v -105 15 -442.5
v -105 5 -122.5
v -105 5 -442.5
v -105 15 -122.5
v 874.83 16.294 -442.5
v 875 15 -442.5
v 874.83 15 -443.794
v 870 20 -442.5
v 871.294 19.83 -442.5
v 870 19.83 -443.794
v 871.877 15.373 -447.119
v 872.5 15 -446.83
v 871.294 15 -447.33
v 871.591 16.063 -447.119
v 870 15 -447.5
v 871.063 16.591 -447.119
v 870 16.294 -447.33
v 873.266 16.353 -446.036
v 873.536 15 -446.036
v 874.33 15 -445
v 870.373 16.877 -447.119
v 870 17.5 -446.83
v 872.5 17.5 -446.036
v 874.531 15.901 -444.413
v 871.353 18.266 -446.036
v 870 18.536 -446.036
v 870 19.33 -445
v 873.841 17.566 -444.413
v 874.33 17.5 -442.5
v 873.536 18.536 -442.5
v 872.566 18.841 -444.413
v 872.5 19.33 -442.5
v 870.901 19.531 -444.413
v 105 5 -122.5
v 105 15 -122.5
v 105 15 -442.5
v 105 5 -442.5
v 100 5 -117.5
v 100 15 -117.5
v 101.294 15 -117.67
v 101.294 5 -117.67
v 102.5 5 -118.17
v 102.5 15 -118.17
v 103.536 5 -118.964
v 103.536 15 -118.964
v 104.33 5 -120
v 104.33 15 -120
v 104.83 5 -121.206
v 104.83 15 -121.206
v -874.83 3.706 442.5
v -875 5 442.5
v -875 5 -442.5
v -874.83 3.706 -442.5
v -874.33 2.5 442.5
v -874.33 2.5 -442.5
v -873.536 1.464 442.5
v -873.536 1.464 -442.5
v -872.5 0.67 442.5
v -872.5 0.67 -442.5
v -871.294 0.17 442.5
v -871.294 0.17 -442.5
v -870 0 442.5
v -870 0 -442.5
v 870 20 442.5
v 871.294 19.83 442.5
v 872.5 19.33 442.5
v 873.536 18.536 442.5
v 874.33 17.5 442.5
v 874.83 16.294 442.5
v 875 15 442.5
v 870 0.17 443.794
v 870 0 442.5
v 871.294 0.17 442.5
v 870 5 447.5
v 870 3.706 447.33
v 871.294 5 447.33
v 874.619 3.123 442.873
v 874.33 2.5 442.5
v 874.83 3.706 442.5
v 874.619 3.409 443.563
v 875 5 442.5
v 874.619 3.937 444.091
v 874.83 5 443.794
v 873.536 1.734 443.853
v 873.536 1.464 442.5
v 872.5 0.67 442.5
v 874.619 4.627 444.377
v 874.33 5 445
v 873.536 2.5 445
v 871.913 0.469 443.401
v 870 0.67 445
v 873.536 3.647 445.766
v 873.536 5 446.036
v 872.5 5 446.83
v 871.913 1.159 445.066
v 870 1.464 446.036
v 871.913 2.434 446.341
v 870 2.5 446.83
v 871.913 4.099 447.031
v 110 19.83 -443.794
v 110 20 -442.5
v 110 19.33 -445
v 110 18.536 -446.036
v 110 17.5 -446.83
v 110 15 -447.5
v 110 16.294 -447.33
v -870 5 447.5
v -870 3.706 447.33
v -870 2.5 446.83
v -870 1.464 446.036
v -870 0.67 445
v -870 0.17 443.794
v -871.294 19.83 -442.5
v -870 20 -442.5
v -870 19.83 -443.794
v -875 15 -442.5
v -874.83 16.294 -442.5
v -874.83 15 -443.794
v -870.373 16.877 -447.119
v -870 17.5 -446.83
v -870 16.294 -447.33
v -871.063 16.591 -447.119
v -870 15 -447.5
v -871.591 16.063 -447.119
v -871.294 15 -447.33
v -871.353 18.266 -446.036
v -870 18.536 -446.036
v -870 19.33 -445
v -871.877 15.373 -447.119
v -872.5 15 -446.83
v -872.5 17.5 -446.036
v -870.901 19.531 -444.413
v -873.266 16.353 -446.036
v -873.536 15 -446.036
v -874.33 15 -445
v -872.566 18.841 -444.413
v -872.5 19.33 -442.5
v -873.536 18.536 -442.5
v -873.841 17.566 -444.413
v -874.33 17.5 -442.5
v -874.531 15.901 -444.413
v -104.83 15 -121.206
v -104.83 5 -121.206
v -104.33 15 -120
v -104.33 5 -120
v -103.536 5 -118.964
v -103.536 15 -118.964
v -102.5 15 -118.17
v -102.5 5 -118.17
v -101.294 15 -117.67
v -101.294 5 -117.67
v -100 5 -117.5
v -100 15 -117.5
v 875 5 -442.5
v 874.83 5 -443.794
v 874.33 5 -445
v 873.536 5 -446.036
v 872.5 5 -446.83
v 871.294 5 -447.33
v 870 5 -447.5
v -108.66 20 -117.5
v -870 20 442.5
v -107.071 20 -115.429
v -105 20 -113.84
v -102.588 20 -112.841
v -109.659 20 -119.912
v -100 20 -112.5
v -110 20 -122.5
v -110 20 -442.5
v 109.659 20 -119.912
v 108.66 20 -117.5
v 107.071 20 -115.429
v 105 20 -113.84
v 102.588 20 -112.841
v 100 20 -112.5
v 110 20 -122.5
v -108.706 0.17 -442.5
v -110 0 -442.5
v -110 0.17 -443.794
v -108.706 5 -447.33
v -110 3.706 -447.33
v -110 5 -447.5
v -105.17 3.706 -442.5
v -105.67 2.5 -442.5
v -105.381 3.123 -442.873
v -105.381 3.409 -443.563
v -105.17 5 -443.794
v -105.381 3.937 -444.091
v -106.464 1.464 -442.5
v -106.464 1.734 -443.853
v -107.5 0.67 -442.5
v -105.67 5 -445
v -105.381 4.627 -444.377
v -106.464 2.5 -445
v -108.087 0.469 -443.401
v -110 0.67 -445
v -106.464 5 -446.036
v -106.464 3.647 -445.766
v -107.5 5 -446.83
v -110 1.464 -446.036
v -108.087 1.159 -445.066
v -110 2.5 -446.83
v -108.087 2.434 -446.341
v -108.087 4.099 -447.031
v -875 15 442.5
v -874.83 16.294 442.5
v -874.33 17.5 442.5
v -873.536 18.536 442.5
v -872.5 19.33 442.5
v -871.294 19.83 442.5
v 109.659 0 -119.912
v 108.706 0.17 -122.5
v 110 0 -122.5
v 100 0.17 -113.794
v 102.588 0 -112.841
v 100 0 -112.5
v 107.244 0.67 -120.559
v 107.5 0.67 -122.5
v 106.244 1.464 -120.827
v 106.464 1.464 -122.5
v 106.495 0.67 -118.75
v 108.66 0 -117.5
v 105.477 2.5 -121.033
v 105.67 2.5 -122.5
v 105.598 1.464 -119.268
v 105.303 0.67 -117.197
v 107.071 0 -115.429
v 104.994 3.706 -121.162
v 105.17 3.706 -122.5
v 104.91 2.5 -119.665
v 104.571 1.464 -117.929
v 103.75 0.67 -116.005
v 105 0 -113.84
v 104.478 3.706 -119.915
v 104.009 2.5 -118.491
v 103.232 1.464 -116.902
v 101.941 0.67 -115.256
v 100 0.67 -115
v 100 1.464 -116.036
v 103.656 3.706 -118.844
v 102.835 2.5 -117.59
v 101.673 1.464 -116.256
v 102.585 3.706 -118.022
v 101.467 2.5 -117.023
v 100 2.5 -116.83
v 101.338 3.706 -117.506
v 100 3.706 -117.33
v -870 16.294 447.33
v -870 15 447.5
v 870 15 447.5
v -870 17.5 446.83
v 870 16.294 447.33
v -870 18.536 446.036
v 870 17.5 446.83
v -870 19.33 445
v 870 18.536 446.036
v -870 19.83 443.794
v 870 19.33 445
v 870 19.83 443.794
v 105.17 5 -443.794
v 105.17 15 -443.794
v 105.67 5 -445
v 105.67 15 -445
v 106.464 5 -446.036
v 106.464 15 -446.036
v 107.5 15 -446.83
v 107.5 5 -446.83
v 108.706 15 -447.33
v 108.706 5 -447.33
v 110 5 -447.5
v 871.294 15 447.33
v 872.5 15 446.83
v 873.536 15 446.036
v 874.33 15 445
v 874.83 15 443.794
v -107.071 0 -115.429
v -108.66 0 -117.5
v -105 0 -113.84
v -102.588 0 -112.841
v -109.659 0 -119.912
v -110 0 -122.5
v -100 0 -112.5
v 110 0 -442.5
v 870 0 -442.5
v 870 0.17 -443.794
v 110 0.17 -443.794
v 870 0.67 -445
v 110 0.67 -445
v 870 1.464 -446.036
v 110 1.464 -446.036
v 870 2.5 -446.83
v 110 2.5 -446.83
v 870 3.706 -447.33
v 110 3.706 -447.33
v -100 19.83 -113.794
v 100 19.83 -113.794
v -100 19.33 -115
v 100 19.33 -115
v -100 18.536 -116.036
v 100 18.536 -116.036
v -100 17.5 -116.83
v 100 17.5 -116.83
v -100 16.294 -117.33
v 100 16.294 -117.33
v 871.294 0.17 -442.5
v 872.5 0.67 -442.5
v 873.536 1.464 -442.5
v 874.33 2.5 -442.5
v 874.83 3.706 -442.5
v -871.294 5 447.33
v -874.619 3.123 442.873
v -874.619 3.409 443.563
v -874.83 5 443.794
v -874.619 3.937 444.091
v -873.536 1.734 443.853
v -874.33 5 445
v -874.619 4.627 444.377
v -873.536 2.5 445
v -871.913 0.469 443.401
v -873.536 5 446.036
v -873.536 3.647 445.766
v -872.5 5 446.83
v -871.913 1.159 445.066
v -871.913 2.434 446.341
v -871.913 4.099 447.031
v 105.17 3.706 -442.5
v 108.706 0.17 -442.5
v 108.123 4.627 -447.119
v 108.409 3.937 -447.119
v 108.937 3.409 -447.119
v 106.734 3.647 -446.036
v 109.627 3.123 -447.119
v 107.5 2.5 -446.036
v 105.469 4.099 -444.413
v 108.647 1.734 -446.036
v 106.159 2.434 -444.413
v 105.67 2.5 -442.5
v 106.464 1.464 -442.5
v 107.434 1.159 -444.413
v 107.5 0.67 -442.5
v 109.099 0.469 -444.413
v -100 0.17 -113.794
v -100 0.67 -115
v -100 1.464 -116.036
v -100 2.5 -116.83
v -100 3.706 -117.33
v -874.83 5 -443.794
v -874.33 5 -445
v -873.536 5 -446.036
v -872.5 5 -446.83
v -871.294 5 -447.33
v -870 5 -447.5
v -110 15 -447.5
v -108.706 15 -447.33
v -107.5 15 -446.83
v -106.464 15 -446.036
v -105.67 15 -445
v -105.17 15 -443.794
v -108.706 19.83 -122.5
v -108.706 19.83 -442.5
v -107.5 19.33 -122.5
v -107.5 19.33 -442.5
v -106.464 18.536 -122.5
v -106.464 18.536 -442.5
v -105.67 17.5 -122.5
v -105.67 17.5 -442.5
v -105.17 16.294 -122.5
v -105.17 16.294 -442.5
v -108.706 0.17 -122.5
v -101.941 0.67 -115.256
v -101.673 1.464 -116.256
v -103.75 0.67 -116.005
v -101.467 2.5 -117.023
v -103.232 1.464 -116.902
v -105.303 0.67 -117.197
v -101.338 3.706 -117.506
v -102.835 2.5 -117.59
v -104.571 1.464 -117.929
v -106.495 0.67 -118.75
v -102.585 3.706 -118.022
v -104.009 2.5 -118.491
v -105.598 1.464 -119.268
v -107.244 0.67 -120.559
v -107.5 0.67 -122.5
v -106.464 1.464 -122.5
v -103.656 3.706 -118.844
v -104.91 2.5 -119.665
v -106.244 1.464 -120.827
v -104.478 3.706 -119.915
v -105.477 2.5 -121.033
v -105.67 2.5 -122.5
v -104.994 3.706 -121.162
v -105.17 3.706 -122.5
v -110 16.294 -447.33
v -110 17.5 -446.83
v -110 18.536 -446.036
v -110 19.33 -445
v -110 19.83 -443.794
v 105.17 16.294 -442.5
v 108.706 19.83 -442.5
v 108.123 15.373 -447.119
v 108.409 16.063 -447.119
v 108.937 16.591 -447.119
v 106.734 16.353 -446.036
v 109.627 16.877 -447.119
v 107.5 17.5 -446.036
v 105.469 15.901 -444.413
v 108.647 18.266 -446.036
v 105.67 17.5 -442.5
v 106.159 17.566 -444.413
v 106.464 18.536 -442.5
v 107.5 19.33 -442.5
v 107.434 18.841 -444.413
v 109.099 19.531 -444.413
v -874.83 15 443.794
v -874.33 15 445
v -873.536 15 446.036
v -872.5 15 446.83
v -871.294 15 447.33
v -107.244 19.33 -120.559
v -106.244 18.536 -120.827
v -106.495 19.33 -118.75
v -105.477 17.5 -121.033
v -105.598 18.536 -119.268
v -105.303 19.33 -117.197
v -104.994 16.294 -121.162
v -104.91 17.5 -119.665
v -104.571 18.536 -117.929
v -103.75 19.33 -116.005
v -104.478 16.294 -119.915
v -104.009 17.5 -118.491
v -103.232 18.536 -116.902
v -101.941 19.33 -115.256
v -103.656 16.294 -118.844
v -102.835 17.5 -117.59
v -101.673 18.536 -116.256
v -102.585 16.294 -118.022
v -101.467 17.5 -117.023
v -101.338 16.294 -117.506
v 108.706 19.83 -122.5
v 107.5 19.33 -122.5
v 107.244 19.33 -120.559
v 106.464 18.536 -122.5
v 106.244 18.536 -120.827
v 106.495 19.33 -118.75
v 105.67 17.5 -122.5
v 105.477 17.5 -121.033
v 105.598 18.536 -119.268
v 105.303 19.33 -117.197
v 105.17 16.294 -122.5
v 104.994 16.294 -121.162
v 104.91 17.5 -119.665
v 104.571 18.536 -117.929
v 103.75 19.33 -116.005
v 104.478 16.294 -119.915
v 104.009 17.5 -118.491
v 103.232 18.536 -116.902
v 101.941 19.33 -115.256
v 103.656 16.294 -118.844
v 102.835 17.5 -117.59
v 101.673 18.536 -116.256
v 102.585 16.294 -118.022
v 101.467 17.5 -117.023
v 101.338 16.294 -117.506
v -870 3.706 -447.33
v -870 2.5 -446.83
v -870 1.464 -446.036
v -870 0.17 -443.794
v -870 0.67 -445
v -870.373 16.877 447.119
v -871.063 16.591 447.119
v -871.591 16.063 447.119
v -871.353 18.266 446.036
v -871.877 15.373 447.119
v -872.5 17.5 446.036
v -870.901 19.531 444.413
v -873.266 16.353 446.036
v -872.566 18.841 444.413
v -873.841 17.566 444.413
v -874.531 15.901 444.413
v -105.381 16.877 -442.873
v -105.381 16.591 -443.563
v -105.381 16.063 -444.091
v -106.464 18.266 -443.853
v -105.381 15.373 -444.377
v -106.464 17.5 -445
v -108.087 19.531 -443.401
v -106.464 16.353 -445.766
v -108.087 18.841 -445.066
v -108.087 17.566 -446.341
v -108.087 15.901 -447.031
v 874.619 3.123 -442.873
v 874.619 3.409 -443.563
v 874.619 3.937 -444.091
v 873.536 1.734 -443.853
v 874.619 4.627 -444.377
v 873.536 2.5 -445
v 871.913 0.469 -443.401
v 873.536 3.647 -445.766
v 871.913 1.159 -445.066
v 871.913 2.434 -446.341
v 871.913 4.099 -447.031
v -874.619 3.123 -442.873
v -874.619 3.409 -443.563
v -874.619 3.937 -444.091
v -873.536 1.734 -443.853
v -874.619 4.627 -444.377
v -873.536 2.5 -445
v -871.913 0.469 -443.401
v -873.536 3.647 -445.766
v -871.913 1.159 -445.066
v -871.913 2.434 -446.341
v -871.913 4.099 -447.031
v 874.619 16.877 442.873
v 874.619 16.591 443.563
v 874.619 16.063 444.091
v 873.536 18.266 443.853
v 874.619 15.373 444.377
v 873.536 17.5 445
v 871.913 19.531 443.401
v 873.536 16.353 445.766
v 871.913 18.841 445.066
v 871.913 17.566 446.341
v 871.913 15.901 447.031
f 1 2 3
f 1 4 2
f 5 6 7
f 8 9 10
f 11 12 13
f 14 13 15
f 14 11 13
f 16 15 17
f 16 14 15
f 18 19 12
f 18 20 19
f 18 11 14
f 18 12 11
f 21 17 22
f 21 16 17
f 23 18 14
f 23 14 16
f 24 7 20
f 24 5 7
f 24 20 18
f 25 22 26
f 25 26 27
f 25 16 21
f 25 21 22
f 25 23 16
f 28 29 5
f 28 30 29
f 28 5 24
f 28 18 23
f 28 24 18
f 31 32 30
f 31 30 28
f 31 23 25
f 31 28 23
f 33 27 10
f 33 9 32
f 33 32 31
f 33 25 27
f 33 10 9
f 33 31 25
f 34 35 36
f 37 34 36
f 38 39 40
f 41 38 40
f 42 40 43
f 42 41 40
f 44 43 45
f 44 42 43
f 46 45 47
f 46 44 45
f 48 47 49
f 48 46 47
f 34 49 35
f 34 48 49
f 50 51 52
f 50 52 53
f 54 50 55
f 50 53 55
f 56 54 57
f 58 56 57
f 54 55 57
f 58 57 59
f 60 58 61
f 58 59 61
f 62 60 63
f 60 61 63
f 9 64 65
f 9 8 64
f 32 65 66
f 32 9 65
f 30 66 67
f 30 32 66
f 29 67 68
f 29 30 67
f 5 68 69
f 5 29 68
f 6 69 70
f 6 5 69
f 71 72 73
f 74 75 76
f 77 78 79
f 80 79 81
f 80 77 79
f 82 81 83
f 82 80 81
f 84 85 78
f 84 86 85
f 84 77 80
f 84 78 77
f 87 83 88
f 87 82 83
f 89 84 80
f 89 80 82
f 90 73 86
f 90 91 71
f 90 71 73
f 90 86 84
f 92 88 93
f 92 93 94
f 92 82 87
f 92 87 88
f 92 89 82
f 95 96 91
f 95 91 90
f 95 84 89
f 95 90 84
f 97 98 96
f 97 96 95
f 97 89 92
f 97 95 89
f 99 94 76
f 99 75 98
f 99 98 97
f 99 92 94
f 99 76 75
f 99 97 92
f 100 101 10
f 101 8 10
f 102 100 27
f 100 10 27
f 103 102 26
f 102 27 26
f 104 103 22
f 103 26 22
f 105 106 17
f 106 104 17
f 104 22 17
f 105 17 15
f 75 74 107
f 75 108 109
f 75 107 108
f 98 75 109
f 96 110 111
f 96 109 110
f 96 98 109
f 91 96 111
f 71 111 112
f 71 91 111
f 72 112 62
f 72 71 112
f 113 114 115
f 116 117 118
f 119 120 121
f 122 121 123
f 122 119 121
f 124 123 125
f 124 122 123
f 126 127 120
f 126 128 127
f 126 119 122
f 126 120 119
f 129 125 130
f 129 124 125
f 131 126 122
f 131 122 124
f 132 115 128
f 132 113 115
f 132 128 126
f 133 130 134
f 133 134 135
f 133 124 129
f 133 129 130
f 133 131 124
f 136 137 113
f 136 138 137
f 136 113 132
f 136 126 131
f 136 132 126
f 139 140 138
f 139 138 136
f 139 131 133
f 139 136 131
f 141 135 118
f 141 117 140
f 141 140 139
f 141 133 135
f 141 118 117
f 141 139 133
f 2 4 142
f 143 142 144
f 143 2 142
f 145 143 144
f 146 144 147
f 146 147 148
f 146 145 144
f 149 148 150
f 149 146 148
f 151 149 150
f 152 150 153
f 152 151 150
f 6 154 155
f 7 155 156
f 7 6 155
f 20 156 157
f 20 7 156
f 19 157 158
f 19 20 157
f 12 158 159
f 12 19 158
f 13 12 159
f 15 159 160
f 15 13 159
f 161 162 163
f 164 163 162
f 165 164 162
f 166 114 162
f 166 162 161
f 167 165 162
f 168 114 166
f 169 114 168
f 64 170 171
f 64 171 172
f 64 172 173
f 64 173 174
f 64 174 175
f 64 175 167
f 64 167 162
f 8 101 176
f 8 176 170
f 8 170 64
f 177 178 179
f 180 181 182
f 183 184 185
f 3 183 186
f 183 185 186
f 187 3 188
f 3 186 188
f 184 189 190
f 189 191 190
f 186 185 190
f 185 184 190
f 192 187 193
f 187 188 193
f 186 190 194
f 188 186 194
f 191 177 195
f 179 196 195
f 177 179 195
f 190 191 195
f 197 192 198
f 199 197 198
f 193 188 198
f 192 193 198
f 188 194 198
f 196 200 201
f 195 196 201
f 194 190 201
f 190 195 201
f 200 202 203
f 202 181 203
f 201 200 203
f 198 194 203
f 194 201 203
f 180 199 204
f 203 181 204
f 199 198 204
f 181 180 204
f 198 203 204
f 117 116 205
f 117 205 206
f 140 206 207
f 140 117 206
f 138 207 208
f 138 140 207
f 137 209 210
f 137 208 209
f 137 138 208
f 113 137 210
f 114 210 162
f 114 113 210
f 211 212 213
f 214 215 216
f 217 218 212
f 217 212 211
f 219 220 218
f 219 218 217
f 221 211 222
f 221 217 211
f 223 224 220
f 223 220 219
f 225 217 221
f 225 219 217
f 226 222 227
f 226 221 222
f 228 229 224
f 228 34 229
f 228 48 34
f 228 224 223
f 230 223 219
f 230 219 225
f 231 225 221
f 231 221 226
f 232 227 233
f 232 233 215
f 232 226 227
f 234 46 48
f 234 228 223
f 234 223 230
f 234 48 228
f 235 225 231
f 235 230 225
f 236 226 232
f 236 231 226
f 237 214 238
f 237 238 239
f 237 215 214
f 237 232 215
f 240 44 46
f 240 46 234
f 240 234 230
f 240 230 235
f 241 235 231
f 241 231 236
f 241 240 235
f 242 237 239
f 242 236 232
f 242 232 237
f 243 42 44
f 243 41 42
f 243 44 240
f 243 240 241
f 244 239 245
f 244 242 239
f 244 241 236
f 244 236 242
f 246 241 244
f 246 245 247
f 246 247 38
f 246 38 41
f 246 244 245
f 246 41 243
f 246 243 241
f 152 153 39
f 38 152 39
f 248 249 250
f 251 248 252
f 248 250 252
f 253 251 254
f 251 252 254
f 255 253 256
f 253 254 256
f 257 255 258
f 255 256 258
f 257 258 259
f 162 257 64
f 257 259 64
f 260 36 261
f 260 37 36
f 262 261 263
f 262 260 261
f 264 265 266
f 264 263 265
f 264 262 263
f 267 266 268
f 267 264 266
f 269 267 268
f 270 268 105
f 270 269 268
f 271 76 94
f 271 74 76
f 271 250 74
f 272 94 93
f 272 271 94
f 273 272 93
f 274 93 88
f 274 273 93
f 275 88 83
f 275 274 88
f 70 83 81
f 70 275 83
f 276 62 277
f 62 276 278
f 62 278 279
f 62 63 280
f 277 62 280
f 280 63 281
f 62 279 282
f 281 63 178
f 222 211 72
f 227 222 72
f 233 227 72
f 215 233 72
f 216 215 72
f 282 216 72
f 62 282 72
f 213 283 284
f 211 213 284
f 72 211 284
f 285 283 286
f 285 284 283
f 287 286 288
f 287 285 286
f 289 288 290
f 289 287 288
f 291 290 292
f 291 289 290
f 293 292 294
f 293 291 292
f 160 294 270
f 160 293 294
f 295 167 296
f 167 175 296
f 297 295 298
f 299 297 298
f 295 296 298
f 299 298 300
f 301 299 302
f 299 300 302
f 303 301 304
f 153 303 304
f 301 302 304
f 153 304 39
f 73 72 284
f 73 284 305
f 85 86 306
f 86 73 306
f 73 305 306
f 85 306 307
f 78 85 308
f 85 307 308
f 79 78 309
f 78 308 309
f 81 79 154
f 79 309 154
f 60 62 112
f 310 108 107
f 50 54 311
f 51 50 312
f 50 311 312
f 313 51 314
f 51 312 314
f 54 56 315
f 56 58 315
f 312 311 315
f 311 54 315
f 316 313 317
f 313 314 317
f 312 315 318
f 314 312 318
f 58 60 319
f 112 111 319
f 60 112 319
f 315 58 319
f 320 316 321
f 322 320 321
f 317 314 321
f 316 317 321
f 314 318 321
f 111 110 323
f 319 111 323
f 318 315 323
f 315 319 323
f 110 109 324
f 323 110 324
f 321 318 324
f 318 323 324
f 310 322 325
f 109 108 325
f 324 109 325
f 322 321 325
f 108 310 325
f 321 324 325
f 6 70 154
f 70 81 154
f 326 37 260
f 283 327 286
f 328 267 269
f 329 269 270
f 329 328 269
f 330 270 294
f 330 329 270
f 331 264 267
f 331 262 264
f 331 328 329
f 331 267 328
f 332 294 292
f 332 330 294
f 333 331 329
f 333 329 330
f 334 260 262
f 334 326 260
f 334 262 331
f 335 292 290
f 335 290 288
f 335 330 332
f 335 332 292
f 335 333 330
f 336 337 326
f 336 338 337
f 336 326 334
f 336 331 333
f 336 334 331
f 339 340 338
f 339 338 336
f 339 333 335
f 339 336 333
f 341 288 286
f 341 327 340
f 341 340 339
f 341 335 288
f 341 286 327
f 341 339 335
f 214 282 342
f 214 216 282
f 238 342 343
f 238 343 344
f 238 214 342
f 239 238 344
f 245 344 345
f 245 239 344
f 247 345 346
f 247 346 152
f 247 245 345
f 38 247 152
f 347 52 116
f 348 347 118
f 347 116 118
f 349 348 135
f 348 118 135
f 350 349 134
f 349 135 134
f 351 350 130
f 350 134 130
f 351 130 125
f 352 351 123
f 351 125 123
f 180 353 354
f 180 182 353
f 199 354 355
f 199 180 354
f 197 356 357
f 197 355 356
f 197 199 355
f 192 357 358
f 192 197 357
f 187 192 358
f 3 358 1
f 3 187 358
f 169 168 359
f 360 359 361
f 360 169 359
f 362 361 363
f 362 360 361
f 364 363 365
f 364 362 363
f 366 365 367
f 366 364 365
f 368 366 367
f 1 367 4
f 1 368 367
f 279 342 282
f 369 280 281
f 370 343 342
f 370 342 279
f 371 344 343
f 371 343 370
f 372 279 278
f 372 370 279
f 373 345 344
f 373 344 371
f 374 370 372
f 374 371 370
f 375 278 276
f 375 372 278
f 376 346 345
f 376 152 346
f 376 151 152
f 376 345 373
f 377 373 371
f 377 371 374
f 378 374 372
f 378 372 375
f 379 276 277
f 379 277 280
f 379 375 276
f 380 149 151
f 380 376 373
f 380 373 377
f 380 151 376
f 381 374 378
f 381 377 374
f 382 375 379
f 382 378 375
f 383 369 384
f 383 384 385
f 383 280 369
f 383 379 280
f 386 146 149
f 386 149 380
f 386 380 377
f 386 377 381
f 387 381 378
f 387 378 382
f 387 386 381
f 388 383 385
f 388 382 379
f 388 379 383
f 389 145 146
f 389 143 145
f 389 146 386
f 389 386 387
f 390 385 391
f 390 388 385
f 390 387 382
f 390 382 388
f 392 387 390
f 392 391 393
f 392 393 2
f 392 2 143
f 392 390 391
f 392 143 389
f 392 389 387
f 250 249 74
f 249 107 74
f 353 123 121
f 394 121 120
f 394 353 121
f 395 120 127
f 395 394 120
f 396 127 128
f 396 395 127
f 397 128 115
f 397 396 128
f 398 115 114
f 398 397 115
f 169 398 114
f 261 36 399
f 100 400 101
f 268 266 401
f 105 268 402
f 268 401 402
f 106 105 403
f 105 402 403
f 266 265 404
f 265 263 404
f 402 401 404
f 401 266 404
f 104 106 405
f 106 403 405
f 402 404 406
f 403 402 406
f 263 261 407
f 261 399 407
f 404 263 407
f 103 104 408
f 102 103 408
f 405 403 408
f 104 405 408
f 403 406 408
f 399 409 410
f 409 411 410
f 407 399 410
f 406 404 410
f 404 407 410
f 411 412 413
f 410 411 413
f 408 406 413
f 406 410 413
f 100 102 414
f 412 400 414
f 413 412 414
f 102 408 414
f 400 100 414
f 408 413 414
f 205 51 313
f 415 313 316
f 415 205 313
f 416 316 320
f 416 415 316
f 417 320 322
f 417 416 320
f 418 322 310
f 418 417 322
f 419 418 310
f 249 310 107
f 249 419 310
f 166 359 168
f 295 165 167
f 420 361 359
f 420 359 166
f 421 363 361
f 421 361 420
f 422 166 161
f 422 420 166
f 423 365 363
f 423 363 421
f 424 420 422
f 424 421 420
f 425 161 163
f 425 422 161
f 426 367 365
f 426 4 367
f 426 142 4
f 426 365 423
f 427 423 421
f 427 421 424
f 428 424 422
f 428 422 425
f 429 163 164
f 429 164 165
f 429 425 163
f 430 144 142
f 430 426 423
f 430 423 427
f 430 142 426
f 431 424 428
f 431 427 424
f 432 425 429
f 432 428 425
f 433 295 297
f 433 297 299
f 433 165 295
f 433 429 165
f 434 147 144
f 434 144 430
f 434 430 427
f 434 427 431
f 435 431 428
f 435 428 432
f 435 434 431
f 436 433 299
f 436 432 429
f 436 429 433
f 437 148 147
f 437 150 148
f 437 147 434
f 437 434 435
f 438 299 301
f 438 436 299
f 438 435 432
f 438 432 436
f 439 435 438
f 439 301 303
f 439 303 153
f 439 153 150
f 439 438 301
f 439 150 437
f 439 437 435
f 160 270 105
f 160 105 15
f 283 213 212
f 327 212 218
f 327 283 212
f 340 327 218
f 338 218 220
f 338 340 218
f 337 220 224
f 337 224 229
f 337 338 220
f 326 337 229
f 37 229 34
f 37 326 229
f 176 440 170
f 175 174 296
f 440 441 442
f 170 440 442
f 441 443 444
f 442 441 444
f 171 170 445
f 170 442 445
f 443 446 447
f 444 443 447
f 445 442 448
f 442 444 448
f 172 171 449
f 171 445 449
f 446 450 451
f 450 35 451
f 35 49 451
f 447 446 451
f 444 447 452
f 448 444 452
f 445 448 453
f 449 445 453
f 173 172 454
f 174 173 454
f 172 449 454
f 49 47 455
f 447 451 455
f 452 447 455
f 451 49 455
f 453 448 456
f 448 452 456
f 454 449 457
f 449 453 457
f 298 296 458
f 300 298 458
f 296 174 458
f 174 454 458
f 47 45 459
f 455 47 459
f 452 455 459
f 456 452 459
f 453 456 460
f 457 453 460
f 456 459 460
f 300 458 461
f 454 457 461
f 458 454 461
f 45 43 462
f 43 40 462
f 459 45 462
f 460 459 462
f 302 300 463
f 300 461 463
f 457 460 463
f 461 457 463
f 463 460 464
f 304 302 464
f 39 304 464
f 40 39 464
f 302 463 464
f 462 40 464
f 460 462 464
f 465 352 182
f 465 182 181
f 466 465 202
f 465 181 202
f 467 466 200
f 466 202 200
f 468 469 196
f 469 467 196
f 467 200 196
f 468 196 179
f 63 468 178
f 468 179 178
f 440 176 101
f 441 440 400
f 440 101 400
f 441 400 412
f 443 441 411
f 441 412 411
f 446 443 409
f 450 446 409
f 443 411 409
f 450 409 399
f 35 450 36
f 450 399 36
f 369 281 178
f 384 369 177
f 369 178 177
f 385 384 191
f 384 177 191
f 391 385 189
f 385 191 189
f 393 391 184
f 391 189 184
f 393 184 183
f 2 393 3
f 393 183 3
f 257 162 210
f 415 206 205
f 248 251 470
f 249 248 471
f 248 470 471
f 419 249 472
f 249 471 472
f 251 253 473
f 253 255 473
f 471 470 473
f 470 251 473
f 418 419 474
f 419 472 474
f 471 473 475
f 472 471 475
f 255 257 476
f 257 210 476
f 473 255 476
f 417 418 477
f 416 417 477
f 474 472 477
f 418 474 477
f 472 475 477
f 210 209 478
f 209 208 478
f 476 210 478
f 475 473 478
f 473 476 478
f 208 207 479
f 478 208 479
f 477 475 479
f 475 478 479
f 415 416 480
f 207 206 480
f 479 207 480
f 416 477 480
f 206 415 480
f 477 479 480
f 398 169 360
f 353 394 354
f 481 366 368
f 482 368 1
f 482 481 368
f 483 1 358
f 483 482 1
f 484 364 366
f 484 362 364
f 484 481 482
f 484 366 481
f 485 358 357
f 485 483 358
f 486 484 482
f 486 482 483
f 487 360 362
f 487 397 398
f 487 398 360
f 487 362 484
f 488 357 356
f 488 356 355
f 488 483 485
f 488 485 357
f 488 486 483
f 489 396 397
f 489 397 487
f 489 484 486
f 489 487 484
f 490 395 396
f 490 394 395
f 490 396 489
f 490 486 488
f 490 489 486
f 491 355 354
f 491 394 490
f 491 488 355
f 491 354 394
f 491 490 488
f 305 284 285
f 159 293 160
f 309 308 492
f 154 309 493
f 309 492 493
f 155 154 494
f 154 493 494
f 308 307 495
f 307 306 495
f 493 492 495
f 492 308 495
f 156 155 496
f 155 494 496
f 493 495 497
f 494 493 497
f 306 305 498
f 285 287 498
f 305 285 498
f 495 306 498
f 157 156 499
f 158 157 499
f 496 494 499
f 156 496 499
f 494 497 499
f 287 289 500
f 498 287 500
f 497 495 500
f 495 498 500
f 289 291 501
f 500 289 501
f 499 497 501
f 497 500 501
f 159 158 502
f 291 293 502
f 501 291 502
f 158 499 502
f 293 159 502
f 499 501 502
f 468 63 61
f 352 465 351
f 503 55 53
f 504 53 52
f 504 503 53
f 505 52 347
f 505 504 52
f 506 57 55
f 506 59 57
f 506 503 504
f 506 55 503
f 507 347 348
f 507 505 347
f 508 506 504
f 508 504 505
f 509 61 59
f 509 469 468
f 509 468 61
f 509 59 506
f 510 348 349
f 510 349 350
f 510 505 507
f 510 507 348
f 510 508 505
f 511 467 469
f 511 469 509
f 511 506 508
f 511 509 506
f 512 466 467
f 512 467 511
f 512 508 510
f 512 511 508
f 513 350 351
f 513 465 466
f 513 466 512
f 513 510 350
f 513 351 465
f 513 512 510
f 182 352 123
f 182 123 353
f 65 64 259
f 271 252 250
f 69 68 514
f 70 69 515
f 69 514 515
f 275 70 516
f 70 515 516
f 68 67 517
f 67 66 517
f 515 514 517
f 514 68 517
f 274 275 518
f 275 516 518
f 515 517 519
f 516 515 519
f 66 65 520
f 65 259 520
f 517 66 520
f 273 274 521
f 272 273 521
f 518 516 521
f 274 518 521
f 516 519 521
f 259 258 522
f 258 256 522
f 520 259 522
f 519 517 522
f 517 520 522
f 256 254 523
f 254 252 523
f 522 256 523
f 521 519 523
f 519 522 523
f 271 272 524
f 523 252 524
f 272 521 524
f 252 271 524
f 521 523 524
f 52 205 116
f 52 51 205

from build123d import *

# Parameters (mm, degrees)
SKETCH1_W           = 1750
SKETCH1_H           = 895
BOSS_EXTRUDE1_DEPTH = 20
SKETCH2_W           = 210
SKETCH2_H           = 660
CUT_EXTRUDE1_DEPTH  = 20
FILLET1_R           = 5


with BuildPart() as part:
    # Sketch1 → Boss-Extrude1 (new body)
    with BuildSketch(Plane(origin=(0, 0, 0), x_dir=(1, 0, 0), z_dir=(0, 1, 0))):
        Rectangle(SKETCH1_W, SKETCH1_H)
    extrude(amount=BOSS_EXTRUDE1_DEPTH)

    # Sketch2 → Cut-Extrude1 (cut)
    with BuildSketch(Plane(origin=(0, 20, 0), x_dir=(1, 0, 0), z_dir=(0, 1, 0))):
        with Locations((0, 447.5)):
            Rectangle(SKETCH2_W, SKETCH2_H)
    extrude(amount=-CUT_EXTRUDE1_DEPTH, mode=Mode.SUBTRACT)

    # Fillet1
    fillet1_edges = [part.edges().sort_by_distance(p)[0] for p in [
        (-875, 20, 0),
        (-490, 0, -447.5),
        (-105, 0, -282.5),
        (-490, 20, -447.5),
        (0, 20, 447.5),
        (105, 20, -282.5),
        (-105, 20, -282.5),
        (0, 20, -117.5),
        (105, 0, -282.5),
        (105, 10, -447.5),
        (-105, 10, -447.5),
        (-105, 10, -117.5),
        (0, 0, -117.5),
        (105, 10, -117.5),
        (875, 20, 0),
        (0, 0, 447.5),
        (-875, 0, 0),
        (490, 0, -447.5),
        (875, 0, 0),
        (875, 10, 447.5),
        (-875, 10, 447.5),
        (-875, 10, -447.5),
        (875, 10, -447.5),
        (490, 20, -447.5),
    ]]
    fillet(fillet1_edges, radius=FILLET1_R)


solid = part.part
